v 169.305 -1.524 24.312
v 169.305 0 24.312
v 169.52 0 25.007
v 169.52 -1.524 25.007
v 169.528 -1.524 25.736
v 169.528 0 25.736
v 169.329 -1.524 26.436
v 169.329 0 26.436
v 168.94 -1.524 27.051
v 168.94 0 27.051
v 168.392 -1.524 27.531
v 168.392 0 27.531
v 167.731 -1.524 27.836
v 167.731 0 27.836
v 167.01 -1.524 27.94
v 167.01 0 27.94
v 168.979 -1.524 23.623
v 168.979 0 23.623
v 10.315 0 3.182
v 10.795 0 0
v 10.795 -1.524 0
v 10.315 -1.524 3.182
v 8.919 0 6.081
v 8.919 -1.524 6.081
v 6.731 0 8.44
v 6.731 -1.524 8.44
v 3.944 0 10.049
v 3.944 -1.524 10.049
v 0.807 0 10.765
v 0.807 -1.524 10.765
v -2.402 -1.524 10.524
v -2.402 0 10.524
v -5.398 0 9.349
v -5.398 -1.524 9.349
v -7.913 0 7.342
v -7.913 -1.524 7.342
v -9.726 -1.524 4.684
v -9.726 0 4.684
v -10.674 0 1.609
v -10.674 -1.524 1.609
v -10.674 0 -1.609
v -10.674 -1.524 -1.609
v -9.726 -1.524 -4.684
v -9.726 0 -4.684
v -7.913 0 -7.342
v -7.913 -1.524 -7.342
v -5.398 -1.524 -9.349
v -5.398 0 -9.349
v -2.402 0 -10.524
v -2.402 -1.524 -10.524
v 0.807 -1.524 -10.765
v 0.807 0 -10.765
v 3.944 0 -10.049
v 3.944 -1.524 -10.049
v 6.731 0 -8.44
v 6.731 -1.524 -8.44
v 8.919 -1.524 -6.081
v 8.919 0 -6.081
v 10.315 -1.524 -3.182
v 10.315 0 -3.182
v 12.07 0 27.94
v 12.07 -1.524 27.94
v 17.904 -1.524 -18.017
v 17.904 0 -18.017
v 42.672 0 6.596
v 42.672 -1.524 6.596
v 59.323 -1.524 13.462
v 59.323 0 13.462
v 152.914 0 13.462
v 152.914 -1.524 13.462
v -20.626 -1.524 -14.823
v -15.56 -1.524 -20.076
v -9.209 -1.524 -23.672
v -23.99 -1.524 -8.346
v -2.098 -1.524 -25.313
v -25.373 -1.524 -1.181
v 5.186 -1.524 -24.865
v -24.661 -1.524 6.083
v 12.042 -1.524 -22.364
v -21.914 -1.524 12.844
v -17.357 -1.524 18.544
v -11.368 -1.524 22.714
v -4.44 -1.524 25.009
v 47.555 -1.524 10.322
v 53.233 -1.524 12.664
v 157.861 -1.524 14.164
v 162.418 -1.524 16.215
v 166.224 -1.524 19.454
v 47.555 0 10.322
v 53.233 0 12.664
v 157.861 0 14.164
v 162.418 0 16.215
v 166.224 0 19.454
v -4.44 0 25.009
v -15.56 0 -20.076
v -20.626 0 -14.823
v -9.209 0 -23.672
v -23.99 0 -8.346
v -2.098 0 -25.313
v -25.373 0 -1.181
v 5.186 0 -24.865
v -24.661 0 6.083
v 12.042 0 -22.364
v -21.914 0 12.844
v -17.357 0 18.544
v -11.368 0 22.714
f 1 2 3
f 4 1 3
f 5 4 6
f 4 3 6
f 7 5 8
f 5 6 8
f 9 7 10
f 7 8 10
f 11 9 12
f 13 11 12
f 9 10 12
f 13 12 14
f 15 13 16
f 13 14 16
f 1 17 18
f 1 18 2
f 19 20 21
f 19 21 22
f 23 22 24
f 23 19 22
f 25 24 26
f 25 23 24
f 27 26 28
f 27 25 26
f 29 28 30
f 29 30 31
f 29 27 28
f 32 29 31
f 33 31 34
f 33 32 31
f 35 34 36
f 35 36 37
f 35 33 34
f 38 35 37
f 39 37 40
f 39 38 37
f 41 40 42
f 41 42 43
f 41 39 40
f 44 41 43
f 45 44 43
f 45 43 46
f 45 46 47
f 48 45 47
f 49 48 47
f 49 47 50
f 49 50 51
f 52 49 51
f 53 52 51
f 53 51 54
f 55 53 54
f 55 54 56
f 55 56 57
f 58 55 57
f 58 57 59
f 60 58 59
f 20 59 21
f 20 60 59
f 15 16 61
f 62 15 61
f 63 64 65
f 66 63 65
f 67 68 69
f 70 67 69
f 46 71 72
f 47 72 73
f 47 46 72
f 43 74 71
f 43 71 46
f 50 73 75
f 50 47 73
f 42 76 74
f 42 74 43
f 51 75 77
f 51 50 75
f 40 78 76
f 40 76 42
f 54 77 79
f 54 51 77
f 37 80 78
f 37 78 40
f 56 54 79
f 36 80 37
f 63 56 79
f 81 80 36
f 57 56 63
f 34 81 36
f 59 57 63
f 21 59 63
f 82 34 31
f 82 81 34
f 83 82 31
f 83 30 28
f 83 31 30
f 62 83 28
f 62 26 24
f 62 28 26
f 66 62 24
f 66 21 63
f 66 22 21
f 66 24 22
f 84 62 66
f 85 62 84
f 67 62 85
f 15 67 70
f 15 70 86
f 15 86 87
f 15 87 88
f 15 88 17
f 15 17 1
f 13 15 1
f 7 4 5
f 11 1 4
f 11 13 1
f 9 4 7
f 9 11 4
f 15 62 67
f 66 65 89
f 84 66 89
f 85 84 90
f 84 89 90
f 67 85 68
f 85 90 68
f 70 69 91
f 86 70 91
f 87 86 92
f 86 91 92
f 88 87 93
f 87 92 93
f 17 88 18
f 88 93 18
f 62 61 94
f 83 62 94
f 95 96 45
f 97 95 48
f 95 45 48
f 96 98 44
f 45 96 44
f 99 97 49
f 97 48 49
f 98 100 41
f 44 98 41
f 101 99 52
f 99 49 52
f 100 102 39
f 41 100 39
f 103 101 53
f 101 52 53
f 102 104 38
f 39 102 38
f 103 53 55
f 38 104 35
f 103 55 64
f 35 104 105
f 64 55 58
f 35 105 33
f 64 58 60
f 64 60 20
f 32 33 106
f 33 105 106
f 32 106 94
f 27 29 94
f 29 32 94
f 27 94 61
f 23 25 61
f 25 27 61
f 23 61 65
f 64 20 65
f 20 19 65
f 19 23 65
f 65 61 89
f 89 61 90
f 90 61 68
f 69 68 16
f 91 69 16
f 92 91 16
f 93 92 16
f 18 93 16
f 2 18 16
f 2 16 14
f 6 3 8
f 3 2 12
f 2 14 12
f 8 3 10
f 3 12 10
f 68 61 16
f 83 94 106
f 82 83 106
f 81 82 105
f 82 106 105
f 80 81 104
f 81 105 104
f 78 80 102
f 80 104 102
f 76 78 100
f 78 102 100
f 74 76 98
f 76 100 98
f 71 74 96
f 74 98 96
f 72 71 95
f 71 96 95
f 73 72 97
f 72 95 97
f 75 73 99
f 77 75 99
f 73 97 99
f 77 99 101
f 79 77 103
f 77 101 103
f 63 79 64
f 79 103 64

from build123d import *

# Parameters (mm, degrees)
F0_R     = 10.795
F1_DEPTH = 1.524


with BuildPart() as f1:
    # F0 (on Front) → F1 (new body)
    with BuildSketch(Plane.XZ):
        with BuildLine():
            ThreePointArc((-4.439889, 25.008946), (16.315435, 19.467064), (25.4, 0))
            ThreePointArc((25.4, 0), (23.451217, -9.75707), (17.903904, -18.016943))
            Line((17.903904, -18.016943), (42.672, 6.595757))
            ThreePointArc((42.672, 6.595757), (50.317232, 11.678079), (59.32263, 13.462))
            Line((59.32263, 13.462), (152.913683, 13.462))
            ThreePointArc((152.913683, 13.462), (162.418002, 16.215479), (168.97857, 23.623089))
            Line((168.97857, 23.623089), (169.305095, 24.311584))
            ThreePointArc((169.305095, 24.311584), (169.156757, 26.75776), (167.010111, 27.94))
            Line((167.010111, 27.94), (12.070111, 27.94))
            Line((12.070111, 27.94), (-4.439889, 25.008946))
        make_face()
        with BuildLine():
            ThreePointArc((17.903904, -18.016943), (23.451217, -9.75707), (25.4, 0))
            ThreePointArc((25.4, 0), (16.315435, 19.467064), (-4.439889, 25.008946))
            ThreePointArc((-4.439889, 25.008946), (-22.541666, -11.706122), (17.903904, -18.016943))
        make_face()
        Circle(F0_R, mode=Mode.SUBTRACT)
    extrude(amount=F1_DEPTH)


solid = f1.part
